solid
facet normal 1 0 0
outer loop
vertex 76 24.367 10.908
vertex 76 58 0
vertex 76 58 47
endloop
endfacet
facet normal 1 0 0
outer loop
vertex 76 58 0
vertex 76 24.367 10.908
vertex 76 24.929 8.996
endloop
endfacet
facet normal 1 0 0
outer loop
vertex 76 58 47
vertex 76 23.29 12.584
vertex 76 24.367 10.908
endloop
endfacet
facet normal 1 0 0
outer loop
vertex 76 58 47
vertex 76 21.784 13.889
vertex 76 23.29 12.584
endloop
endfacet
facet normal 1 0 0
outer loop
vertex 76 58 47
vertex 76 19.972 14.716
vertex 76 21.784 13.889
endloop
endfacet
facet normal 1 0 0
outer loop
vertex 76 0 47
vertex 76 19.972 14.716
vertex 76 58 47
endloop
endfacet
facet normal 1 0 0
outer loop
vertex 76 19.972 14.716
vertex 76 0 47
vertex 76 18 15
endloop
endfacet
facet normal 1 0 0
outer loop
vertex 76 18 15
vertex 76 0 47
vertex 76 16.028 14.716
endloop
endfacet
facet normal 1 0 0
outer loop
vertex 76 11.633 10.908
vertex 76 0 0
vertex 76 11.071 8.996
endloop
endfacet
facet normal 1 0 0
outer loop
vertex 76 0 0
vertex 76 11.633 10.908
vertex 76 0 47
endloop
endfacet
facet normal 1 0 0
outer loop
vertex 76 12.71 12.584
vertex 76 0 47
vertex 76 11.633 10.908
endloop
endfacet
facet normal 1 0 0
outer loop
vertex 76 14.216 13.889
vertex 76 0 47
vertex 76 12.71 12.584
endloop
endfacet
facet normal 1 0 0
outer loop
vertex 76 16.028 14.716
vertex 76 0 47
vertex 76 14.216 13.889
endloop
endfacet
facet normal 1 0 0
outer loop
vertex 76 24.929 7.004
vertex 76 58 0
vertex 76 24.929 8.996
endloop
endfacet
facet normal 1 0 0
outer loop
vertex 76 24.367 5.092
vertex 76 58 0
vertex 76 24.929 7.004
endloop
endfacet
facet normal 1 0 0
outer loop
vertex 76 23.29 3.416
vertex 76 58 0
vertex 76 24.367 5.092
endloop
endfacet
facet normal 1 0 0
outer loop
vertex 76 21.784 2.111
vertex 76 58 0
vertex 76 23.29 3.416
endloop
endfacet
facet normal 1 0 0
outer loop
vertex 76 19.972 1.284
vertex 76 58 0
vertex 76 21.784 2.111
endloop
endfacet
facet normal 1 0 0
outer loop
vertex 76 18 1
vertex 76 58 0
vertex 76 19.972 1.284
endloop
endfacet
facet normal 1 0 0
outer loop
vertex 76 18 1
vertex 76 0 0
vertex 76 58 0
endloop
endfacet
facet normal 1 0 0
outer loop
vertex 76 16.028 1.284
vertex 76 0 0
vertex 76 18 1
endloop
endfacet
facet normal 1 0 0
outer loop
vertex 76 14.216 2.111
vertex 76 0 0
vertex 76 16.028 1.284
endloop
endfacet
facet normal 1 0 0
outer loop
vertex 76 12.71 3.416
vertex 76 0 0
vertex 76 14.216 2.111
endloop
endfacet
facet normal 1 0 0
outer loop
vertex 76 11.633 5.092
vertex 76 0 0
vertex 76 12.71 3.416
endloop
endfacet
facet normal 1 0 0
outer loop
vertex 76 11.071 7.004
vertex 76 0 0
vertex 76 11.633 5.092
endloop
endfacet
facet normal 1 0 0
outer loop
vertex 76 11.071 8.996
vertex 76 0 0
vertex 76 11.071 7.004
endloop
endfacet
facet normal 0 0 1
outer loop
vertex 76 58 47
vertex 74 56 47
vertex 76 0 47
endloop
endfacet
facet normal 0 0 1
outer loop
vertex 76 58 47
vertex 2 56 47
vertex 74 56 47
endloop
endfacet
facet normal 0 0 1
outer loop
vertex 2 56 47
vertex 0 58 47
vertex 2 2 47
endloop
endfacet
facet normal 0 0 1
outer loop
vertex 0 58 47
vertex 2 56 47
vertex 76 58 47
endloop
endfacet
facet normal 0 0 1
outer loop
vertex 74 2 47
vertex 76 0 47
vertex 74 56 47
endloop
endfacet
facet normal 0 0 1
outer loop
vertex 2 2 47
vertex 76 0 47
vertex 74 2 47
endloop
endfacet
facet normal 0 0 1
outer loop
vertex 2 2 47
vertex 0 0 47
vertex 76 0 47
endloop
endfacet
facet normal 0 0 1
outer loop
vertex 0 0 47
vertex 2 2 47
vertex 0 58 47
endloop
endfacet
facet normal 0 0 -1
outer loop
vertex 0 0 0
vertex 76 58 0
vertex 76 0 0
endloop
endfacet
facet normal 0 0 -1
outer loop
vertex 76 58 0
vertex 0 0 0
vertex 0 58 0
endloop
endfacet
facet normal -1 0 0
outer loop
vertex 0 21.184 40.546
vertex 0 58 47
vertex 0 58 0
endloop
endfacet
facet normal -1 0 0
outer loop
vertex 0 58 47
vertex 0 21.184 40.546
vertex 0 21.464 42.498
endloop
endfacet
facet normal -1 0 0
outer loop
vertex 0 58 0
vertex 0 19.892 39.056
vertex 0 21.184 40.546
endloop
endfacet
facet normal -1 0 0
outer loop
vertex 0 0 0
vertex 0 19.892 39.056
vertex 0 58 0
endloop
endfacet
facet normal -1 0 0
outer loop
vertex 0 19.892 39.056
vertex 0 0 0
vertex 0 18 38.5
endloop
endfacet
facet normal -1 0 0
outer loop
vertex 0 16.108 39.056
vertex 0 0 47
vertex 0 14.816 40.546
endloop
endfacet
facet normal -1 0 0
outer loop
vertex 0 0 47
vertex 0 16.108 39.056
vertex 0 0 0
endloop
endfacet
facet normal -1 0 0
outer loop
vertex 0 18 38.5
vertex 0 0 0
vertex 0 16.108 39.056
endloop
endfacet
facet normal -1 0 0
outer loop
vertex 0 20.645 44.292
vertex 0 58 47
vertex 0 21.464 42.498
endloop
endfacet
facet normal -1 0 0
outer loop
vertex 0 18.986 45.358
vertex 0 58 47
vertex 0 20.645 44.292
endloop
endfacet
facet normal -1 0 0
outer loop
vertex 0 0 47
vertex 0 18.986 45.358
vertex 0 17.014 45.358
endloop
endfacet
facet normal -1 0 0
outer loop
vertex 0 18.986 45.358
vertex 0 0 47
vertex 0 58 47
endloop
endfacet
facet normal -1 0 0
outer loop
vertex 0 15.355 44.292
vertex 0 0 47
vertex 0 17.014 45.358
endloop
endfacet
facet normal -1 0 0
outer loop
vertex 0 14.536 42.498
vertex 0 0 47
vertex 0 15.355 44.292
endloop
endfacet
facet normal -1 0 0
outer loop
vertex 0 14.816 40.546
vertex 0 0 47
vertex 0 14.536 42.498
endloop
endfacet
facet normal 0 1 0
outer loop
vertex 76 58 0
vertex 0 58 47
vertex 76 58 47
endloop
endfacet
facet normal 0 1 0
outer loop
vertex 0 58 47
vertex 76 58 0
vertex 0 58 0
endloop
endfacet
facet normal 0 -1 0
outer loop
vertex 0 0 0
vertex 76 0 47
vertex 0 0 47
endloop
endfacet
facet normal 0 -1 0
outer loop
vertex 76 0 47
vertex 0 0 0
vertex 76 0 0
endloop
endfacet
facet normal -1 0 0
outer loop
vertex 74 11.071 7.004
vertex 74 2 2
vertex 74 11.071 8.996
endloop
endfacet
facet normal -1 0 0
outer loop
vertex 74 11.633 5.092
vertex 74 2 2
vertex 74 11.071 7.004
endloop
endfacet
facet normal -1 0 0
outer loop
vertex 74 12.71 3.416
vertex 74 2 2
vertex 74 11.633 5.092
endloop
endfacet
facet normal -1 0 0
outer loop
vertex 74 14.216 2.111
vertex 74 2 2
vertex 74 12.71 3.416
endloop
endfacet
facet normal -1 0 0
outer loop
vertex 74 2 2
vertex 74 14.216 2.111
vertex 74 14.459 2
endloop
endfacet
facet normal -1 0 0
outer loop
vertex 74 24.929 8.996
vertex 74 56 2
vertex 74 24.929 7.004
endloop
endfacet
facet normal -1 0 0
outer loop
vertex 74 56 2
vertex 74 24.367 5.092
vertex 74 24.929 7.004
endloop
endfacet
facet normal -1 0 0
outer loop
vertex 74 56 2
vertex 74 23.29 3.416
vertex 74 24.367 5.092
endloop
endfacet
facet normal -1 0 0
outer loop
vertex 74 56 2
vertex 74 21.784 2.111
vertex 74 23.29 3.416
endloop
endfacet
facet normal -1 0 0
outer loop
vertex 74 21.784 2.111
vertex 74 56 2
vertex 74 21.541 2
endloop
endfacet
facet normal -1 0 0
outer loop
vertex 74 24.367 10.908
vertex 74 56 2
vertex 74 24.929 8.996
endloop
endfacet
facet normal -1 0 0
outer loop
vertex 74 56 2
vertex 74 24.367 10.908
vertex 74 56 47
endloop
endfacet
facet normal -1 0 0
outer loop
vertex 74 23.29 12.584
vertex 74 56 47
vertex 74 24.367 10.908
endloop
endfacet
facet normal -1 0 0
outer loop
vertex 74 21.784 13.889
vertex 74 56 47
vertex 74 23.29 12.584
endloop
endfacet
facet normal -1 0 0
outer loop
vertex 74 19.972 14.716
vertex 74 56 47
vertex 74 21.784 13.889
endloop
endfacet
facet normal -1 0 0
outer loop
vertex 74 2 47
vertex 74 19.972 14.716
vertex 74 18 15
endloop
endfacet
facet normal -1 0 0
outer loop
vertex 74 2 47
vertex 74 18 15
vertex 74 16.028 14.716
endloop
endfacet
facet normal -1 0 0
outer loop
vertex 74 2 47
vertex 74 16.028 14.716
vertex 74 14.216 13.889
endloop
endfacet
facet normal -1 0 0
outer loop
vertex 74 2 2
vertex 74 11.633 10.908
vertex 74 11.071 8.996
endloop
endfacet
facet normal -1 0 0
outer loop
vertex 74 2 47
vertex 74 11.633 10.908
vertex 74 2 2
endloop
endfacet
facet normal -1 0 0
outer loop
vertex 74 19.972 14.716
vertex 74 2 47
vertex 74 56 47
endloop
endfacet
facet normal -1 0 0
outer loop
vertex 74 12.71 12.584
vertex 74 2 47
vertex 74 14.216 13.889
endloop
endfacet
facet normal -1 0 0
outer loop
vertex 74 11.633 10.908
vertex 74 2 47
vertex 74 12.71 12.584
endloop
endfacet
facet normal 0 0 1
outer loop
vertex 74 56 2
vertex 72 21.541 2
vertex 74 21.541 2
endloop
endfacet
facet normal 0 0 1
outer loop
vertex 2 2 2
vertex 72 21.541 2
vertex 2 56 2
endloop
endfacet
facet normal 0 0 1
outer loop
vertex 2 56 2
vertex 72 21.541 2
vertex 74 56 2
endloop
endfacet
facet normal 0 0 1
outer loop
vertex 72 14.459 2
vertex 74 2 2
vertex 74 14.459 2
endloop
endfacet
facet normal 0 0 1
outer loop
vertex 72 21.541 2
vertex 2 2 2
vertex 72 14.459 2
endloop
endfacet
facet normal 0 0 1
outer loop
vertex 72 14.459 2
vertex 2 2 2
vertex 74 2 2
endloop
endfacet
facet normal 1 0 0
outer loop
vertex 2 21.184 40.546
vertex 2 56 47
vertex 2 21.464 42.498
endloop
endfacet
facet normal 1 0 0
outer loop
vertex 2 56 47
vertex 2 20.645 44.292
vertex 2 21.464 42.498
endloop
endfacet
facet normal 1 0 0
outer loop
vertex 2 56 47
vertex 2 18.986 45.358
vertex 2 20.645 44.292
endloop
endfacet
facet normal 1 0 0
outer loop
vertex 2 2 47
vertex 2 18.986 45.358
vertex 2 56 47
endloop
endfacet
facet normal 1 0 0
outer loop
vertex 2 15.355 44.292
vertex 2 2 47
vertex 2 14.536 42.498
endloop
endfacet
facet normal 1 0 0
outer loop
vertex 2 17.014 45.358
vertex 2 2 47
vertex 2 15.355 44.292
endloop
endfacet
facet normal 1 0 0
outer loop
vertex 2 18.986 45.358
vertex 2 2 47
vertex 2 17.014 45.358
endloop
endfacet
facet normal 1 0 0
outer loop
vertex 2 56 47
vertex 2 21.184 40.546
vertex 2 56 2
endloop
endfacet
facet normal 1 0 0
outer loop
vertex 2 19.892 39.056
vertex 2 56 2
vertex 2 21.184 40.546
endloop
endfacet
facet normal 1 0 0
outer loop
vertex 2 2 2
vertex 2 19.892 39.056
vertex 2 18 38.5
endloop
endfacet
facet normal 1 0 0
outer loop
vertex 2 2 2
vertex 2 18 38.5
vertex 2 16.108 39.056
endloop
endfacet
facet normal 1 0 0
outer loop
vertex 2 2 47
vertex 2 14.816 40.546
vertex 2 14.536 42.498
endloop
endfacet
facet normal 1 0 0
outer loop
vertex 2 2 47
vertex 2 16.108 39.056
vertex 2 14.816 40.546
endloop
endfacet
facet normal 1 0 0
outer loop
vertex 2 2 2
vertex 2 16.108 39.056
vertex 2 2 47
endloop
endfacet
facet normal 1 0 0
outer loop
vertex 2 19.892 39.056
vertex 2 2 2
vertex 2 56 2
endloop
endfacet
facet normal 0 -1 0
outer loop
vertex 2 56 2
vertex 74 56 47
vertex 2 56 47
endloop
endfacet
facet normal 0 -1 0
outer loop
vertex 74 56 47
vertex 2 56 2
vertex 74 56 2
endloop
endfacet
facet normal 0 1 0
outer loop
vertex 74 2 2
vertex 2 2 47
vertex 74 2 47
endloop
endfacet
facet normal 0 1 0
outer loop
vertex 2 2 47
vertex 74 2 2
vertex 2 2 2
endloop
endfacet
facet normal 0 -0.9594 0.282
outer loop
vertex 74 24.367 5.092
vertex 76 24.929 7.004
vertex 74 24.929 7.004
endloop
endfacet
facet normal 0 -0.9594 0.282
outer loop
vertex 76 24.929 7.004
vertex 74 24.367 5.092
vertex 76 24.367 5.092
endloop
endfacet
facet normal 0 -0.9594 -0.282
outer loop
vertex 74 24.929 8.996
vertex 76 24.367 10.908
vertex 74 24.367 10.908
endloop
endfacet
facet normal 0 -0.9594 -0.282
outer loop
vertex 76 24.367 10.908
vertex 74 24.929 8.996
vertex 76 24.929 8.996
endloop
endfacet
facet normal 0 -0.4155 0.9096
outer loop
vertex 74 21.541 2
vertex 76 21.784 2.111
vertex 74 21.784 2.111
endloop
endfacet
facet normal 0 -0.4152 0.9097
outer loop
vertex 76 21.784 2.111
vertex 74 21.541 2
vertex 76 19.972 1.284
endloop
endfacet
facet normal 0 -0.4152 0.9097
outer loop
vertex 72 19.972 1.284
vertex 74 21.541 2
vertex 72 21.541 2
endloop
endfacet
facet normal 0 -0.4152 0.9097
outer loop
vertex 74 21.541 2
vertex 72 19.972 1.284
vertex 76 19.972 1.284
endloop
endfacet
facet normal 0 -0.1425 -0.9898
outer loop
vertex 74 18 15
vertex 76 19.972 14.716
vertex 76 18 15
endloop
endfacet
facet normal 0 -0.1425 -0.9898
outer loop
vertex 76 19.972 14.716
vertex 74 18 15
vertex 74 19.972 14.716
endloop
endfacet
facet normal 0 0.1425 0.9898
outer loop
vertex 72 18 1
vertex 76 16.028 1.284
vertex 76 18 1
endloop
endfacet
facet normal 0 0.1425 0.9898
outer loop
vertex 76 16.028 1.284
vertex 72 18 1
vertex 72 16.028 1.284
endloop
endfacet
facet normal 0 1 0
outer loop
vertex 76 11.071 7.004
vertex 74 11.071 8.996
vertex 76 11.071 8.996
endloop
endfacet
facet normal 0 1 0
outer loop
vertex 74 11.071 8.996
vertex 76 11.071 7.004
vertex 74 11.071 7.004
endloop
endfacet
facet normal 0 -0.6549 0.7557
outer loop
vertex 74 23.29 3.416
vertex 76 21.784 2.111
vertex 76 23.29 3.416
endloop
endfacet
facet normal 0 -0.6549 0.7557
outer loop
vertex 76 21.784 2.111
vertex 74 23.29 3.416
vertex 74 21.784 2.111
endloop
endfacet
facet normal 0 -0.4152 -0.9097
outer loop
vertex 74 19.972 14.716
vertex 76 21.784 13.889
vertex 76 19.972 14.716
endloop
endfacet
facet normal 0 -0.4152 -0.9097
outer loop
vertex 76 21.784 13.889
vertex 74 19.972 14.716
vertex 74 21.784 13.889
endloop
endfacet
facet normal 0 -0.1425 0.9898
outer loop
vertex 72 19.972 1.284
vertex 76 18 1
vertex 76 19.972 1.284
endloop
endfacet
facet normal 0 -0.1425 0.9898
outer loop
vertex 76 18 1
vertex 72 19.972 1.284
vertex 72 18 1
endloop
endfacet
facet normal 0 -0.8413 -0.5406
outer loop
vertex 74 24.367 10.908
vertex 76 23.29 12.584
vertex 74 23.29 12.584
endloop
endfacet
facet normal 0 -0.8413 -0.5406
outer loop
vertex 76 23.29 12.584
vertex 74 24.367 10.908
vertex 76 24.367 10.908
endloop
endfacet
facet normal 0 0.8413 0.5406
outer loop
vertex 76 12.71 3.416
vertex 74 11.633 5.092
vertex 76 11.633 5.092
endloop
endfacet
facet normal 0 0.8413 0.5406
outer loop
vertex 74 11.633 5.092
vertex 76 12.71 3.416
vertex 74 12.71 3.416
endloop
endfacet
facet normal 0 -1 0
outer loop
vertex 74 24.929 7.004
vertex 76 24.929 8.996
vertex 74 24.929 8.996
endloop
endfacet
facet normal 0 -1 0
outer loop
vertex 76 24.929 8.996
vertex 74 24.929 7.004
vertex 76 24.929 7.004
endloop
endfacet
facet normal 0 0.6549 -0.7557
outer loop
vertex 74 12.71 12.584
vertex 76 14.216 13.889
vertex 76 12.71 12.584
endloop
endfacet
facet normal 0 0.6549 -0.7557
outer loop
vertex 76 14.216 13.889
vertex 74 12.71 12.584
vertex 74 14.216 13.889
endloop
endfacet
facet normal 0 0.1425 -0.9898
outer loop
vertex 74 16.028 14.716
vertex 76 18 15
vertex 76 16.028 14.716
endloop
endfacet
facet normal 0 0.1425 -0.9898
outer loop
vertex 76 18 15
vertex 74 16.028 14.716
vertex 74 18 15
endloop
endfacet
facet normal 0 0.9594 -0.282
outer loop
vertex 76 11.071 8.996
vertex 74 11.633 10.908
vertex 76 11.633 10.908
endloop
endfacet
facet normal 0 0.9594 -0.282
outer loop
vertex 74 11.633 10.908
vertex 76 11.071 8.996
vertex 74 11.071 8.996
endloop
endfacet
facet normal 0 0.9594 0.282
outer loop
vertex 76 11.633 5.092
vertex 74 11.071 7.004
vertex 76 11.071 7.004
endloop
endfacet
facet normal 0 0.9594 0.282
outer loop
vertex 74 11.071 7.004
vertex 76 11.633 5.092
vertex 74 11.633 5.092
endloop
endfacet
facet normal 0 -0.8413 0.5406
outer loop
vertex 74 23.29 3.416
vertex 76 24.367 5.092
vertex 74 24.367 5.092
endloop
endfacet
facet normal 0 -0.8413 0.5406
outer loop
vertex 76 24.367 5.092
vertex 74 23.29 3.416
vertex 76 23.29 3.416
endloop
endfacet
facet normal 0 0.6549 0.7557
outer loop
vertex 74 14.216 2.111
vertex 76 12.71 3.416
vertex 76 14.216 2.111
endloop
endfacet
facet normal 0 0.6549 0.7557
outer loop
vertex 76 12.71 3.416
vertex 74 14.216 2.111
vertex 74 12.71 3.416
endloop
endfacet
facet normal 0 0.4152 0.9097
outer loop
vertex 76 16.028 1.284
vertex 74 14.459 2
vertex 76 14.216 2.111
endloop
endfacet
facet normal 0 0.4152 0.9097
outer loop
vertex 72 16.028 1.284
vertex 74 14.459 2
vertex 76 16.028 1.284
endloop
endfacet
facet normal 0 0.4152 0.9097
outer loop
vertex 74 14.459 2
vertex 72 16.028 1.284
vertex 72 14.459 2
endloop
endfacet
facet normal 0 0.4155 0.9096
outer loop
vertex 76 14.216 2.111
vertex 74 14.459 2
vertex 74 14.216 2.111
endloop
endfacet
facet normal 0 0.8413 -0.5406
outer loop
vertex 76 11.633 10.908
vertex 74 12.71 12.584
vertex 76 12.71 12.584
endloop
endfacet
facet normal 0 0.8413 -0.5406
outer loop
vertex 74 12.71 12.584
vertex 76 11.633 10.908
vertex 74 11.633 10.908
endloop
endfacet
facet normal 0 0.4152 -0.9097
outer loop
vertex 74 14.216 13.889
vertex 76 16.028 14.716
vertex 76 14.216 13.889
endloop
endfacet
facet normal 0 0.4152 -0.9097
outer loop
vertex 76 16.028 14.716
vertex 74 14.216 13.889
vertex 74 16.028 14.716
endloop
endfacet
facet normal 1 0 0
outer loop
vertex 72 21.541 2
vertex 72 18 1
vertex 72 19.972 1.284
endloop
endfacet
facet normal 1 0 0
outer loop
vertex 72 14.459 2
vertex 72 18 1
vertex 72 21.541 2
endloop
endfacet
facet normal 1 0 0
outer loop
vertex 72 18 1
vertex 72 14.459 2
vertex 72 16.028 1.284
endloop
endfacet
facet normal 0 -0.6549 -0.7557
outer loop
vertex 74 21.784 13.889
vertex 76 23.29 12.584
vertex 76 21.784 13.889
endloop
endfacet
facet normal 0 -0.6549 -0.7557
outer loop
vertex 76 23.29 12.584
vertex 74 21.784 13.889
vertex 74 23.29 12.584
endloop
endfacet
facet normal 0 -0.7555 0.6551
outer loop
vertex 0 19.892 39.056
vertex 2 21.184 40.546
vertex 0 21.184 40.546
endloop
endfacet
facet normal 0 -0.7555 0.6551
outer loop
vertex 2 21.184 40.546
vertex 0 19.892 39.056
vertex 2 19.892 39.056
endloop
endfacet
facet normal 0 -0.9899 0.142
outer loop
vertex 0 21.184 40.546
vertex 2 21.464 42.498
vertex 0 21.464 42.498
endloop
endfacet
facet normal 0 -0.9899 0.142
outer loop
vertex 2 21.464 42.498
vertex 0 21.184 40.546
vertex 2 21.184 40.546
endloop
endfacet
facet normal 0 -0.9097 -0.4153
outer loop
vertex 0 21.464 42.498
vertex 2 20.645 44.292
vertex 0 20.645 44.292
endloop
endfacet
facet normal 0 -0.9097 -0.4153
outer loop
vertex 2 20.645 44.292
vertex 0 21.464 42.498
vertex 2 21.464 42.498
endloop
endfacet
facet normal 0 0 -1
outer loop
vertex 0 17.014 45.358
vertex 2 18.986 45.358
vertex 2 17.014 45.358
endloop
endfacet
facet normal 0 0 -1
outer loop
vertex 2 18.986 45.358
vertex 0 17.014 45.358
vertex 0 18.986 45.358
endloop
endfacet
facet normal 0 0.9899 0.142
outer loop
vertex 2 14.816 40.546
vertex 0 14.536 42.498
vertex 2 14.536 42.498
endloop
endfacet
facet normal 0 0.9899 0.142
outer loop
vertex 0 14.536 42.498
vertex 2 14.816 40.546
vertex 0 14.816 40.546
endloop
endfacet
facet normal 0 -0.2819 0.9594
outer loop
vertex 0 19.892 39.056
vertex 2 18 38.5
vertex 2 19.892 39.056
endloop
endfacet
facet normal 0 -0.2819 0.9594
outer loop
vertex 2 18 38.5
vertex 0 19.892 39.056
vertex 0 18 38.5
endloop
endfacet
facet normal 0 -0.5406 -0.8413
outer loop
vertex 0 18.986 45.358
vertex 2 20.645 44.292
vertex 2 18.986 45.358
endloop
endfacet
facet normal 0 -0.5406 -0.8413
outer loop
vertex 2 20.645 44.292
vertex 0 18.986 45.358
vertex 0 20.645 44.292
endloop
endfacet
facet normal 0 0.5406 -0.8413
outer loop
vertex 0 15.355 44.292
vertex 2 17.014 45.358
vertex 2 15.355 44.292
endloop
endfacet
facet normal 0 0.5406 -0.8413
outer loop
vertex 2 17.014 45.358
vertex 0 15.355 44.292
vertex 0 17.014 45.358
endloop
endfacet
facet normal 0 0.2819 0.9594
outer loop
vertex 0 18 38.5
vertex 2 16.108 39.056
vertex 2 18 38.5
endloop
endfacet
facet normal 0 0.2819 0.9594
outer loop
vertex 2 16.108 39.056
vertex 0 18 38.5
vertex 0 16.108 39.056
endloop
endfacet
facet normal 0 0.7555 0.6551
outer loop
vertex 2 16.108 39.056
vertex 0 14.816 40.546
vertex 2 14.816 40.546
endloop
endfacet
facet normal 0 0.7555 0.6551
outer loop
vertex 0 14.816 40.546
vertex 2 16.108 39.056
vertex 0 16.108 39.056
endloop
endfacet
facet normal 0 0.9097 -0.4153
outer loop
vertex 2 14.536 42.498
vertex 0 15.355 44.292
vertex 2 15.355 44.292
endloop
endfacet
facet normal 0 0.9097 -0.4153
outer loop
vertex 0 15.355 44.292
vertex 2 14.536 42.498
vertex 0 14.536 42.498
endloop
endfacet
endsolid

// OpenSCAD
box_height=45;

arduino_length=72;
arduino_width=54;
arduino_height=24;
arduino_power_plug_width=16;
arduino_power_plug_height=6;
arduino_power_plug_radius=7;

motor_width=45;
motor_power_plug_width=16;
motor_power_plug_height=25;
tube_diameter=7;

out_height=20;
out_length=14;

in_height=13;
in_width=30;

cable_path_length=10;
cable_path_height=40;

// Which side the sensor
sensor_width=16;
sensor_height=40;

thickness=2;

difference() {
	cube([arduino_length + 2 * thickness, arduino_width + 2 * thickness, box_height + thickness]);
	translate ([thickness, thickness, thickness]) cube([arduino_length, arduino_width, box_height]);

	translate([arduino_length, arduino_power_plug_width + 1 * thickness, arduino_power_plug_height + thickness]) rotate([0, 90, 0]) cylinder(2 * thickness, r=arduino_power_plug_radius);
        translate([-1, sensor_width + 1 * thickness, sensor_height + thickness]) rotate([0, 90, 0]) cylinder(2 * thickness, r=tube_diameter/2);
}
